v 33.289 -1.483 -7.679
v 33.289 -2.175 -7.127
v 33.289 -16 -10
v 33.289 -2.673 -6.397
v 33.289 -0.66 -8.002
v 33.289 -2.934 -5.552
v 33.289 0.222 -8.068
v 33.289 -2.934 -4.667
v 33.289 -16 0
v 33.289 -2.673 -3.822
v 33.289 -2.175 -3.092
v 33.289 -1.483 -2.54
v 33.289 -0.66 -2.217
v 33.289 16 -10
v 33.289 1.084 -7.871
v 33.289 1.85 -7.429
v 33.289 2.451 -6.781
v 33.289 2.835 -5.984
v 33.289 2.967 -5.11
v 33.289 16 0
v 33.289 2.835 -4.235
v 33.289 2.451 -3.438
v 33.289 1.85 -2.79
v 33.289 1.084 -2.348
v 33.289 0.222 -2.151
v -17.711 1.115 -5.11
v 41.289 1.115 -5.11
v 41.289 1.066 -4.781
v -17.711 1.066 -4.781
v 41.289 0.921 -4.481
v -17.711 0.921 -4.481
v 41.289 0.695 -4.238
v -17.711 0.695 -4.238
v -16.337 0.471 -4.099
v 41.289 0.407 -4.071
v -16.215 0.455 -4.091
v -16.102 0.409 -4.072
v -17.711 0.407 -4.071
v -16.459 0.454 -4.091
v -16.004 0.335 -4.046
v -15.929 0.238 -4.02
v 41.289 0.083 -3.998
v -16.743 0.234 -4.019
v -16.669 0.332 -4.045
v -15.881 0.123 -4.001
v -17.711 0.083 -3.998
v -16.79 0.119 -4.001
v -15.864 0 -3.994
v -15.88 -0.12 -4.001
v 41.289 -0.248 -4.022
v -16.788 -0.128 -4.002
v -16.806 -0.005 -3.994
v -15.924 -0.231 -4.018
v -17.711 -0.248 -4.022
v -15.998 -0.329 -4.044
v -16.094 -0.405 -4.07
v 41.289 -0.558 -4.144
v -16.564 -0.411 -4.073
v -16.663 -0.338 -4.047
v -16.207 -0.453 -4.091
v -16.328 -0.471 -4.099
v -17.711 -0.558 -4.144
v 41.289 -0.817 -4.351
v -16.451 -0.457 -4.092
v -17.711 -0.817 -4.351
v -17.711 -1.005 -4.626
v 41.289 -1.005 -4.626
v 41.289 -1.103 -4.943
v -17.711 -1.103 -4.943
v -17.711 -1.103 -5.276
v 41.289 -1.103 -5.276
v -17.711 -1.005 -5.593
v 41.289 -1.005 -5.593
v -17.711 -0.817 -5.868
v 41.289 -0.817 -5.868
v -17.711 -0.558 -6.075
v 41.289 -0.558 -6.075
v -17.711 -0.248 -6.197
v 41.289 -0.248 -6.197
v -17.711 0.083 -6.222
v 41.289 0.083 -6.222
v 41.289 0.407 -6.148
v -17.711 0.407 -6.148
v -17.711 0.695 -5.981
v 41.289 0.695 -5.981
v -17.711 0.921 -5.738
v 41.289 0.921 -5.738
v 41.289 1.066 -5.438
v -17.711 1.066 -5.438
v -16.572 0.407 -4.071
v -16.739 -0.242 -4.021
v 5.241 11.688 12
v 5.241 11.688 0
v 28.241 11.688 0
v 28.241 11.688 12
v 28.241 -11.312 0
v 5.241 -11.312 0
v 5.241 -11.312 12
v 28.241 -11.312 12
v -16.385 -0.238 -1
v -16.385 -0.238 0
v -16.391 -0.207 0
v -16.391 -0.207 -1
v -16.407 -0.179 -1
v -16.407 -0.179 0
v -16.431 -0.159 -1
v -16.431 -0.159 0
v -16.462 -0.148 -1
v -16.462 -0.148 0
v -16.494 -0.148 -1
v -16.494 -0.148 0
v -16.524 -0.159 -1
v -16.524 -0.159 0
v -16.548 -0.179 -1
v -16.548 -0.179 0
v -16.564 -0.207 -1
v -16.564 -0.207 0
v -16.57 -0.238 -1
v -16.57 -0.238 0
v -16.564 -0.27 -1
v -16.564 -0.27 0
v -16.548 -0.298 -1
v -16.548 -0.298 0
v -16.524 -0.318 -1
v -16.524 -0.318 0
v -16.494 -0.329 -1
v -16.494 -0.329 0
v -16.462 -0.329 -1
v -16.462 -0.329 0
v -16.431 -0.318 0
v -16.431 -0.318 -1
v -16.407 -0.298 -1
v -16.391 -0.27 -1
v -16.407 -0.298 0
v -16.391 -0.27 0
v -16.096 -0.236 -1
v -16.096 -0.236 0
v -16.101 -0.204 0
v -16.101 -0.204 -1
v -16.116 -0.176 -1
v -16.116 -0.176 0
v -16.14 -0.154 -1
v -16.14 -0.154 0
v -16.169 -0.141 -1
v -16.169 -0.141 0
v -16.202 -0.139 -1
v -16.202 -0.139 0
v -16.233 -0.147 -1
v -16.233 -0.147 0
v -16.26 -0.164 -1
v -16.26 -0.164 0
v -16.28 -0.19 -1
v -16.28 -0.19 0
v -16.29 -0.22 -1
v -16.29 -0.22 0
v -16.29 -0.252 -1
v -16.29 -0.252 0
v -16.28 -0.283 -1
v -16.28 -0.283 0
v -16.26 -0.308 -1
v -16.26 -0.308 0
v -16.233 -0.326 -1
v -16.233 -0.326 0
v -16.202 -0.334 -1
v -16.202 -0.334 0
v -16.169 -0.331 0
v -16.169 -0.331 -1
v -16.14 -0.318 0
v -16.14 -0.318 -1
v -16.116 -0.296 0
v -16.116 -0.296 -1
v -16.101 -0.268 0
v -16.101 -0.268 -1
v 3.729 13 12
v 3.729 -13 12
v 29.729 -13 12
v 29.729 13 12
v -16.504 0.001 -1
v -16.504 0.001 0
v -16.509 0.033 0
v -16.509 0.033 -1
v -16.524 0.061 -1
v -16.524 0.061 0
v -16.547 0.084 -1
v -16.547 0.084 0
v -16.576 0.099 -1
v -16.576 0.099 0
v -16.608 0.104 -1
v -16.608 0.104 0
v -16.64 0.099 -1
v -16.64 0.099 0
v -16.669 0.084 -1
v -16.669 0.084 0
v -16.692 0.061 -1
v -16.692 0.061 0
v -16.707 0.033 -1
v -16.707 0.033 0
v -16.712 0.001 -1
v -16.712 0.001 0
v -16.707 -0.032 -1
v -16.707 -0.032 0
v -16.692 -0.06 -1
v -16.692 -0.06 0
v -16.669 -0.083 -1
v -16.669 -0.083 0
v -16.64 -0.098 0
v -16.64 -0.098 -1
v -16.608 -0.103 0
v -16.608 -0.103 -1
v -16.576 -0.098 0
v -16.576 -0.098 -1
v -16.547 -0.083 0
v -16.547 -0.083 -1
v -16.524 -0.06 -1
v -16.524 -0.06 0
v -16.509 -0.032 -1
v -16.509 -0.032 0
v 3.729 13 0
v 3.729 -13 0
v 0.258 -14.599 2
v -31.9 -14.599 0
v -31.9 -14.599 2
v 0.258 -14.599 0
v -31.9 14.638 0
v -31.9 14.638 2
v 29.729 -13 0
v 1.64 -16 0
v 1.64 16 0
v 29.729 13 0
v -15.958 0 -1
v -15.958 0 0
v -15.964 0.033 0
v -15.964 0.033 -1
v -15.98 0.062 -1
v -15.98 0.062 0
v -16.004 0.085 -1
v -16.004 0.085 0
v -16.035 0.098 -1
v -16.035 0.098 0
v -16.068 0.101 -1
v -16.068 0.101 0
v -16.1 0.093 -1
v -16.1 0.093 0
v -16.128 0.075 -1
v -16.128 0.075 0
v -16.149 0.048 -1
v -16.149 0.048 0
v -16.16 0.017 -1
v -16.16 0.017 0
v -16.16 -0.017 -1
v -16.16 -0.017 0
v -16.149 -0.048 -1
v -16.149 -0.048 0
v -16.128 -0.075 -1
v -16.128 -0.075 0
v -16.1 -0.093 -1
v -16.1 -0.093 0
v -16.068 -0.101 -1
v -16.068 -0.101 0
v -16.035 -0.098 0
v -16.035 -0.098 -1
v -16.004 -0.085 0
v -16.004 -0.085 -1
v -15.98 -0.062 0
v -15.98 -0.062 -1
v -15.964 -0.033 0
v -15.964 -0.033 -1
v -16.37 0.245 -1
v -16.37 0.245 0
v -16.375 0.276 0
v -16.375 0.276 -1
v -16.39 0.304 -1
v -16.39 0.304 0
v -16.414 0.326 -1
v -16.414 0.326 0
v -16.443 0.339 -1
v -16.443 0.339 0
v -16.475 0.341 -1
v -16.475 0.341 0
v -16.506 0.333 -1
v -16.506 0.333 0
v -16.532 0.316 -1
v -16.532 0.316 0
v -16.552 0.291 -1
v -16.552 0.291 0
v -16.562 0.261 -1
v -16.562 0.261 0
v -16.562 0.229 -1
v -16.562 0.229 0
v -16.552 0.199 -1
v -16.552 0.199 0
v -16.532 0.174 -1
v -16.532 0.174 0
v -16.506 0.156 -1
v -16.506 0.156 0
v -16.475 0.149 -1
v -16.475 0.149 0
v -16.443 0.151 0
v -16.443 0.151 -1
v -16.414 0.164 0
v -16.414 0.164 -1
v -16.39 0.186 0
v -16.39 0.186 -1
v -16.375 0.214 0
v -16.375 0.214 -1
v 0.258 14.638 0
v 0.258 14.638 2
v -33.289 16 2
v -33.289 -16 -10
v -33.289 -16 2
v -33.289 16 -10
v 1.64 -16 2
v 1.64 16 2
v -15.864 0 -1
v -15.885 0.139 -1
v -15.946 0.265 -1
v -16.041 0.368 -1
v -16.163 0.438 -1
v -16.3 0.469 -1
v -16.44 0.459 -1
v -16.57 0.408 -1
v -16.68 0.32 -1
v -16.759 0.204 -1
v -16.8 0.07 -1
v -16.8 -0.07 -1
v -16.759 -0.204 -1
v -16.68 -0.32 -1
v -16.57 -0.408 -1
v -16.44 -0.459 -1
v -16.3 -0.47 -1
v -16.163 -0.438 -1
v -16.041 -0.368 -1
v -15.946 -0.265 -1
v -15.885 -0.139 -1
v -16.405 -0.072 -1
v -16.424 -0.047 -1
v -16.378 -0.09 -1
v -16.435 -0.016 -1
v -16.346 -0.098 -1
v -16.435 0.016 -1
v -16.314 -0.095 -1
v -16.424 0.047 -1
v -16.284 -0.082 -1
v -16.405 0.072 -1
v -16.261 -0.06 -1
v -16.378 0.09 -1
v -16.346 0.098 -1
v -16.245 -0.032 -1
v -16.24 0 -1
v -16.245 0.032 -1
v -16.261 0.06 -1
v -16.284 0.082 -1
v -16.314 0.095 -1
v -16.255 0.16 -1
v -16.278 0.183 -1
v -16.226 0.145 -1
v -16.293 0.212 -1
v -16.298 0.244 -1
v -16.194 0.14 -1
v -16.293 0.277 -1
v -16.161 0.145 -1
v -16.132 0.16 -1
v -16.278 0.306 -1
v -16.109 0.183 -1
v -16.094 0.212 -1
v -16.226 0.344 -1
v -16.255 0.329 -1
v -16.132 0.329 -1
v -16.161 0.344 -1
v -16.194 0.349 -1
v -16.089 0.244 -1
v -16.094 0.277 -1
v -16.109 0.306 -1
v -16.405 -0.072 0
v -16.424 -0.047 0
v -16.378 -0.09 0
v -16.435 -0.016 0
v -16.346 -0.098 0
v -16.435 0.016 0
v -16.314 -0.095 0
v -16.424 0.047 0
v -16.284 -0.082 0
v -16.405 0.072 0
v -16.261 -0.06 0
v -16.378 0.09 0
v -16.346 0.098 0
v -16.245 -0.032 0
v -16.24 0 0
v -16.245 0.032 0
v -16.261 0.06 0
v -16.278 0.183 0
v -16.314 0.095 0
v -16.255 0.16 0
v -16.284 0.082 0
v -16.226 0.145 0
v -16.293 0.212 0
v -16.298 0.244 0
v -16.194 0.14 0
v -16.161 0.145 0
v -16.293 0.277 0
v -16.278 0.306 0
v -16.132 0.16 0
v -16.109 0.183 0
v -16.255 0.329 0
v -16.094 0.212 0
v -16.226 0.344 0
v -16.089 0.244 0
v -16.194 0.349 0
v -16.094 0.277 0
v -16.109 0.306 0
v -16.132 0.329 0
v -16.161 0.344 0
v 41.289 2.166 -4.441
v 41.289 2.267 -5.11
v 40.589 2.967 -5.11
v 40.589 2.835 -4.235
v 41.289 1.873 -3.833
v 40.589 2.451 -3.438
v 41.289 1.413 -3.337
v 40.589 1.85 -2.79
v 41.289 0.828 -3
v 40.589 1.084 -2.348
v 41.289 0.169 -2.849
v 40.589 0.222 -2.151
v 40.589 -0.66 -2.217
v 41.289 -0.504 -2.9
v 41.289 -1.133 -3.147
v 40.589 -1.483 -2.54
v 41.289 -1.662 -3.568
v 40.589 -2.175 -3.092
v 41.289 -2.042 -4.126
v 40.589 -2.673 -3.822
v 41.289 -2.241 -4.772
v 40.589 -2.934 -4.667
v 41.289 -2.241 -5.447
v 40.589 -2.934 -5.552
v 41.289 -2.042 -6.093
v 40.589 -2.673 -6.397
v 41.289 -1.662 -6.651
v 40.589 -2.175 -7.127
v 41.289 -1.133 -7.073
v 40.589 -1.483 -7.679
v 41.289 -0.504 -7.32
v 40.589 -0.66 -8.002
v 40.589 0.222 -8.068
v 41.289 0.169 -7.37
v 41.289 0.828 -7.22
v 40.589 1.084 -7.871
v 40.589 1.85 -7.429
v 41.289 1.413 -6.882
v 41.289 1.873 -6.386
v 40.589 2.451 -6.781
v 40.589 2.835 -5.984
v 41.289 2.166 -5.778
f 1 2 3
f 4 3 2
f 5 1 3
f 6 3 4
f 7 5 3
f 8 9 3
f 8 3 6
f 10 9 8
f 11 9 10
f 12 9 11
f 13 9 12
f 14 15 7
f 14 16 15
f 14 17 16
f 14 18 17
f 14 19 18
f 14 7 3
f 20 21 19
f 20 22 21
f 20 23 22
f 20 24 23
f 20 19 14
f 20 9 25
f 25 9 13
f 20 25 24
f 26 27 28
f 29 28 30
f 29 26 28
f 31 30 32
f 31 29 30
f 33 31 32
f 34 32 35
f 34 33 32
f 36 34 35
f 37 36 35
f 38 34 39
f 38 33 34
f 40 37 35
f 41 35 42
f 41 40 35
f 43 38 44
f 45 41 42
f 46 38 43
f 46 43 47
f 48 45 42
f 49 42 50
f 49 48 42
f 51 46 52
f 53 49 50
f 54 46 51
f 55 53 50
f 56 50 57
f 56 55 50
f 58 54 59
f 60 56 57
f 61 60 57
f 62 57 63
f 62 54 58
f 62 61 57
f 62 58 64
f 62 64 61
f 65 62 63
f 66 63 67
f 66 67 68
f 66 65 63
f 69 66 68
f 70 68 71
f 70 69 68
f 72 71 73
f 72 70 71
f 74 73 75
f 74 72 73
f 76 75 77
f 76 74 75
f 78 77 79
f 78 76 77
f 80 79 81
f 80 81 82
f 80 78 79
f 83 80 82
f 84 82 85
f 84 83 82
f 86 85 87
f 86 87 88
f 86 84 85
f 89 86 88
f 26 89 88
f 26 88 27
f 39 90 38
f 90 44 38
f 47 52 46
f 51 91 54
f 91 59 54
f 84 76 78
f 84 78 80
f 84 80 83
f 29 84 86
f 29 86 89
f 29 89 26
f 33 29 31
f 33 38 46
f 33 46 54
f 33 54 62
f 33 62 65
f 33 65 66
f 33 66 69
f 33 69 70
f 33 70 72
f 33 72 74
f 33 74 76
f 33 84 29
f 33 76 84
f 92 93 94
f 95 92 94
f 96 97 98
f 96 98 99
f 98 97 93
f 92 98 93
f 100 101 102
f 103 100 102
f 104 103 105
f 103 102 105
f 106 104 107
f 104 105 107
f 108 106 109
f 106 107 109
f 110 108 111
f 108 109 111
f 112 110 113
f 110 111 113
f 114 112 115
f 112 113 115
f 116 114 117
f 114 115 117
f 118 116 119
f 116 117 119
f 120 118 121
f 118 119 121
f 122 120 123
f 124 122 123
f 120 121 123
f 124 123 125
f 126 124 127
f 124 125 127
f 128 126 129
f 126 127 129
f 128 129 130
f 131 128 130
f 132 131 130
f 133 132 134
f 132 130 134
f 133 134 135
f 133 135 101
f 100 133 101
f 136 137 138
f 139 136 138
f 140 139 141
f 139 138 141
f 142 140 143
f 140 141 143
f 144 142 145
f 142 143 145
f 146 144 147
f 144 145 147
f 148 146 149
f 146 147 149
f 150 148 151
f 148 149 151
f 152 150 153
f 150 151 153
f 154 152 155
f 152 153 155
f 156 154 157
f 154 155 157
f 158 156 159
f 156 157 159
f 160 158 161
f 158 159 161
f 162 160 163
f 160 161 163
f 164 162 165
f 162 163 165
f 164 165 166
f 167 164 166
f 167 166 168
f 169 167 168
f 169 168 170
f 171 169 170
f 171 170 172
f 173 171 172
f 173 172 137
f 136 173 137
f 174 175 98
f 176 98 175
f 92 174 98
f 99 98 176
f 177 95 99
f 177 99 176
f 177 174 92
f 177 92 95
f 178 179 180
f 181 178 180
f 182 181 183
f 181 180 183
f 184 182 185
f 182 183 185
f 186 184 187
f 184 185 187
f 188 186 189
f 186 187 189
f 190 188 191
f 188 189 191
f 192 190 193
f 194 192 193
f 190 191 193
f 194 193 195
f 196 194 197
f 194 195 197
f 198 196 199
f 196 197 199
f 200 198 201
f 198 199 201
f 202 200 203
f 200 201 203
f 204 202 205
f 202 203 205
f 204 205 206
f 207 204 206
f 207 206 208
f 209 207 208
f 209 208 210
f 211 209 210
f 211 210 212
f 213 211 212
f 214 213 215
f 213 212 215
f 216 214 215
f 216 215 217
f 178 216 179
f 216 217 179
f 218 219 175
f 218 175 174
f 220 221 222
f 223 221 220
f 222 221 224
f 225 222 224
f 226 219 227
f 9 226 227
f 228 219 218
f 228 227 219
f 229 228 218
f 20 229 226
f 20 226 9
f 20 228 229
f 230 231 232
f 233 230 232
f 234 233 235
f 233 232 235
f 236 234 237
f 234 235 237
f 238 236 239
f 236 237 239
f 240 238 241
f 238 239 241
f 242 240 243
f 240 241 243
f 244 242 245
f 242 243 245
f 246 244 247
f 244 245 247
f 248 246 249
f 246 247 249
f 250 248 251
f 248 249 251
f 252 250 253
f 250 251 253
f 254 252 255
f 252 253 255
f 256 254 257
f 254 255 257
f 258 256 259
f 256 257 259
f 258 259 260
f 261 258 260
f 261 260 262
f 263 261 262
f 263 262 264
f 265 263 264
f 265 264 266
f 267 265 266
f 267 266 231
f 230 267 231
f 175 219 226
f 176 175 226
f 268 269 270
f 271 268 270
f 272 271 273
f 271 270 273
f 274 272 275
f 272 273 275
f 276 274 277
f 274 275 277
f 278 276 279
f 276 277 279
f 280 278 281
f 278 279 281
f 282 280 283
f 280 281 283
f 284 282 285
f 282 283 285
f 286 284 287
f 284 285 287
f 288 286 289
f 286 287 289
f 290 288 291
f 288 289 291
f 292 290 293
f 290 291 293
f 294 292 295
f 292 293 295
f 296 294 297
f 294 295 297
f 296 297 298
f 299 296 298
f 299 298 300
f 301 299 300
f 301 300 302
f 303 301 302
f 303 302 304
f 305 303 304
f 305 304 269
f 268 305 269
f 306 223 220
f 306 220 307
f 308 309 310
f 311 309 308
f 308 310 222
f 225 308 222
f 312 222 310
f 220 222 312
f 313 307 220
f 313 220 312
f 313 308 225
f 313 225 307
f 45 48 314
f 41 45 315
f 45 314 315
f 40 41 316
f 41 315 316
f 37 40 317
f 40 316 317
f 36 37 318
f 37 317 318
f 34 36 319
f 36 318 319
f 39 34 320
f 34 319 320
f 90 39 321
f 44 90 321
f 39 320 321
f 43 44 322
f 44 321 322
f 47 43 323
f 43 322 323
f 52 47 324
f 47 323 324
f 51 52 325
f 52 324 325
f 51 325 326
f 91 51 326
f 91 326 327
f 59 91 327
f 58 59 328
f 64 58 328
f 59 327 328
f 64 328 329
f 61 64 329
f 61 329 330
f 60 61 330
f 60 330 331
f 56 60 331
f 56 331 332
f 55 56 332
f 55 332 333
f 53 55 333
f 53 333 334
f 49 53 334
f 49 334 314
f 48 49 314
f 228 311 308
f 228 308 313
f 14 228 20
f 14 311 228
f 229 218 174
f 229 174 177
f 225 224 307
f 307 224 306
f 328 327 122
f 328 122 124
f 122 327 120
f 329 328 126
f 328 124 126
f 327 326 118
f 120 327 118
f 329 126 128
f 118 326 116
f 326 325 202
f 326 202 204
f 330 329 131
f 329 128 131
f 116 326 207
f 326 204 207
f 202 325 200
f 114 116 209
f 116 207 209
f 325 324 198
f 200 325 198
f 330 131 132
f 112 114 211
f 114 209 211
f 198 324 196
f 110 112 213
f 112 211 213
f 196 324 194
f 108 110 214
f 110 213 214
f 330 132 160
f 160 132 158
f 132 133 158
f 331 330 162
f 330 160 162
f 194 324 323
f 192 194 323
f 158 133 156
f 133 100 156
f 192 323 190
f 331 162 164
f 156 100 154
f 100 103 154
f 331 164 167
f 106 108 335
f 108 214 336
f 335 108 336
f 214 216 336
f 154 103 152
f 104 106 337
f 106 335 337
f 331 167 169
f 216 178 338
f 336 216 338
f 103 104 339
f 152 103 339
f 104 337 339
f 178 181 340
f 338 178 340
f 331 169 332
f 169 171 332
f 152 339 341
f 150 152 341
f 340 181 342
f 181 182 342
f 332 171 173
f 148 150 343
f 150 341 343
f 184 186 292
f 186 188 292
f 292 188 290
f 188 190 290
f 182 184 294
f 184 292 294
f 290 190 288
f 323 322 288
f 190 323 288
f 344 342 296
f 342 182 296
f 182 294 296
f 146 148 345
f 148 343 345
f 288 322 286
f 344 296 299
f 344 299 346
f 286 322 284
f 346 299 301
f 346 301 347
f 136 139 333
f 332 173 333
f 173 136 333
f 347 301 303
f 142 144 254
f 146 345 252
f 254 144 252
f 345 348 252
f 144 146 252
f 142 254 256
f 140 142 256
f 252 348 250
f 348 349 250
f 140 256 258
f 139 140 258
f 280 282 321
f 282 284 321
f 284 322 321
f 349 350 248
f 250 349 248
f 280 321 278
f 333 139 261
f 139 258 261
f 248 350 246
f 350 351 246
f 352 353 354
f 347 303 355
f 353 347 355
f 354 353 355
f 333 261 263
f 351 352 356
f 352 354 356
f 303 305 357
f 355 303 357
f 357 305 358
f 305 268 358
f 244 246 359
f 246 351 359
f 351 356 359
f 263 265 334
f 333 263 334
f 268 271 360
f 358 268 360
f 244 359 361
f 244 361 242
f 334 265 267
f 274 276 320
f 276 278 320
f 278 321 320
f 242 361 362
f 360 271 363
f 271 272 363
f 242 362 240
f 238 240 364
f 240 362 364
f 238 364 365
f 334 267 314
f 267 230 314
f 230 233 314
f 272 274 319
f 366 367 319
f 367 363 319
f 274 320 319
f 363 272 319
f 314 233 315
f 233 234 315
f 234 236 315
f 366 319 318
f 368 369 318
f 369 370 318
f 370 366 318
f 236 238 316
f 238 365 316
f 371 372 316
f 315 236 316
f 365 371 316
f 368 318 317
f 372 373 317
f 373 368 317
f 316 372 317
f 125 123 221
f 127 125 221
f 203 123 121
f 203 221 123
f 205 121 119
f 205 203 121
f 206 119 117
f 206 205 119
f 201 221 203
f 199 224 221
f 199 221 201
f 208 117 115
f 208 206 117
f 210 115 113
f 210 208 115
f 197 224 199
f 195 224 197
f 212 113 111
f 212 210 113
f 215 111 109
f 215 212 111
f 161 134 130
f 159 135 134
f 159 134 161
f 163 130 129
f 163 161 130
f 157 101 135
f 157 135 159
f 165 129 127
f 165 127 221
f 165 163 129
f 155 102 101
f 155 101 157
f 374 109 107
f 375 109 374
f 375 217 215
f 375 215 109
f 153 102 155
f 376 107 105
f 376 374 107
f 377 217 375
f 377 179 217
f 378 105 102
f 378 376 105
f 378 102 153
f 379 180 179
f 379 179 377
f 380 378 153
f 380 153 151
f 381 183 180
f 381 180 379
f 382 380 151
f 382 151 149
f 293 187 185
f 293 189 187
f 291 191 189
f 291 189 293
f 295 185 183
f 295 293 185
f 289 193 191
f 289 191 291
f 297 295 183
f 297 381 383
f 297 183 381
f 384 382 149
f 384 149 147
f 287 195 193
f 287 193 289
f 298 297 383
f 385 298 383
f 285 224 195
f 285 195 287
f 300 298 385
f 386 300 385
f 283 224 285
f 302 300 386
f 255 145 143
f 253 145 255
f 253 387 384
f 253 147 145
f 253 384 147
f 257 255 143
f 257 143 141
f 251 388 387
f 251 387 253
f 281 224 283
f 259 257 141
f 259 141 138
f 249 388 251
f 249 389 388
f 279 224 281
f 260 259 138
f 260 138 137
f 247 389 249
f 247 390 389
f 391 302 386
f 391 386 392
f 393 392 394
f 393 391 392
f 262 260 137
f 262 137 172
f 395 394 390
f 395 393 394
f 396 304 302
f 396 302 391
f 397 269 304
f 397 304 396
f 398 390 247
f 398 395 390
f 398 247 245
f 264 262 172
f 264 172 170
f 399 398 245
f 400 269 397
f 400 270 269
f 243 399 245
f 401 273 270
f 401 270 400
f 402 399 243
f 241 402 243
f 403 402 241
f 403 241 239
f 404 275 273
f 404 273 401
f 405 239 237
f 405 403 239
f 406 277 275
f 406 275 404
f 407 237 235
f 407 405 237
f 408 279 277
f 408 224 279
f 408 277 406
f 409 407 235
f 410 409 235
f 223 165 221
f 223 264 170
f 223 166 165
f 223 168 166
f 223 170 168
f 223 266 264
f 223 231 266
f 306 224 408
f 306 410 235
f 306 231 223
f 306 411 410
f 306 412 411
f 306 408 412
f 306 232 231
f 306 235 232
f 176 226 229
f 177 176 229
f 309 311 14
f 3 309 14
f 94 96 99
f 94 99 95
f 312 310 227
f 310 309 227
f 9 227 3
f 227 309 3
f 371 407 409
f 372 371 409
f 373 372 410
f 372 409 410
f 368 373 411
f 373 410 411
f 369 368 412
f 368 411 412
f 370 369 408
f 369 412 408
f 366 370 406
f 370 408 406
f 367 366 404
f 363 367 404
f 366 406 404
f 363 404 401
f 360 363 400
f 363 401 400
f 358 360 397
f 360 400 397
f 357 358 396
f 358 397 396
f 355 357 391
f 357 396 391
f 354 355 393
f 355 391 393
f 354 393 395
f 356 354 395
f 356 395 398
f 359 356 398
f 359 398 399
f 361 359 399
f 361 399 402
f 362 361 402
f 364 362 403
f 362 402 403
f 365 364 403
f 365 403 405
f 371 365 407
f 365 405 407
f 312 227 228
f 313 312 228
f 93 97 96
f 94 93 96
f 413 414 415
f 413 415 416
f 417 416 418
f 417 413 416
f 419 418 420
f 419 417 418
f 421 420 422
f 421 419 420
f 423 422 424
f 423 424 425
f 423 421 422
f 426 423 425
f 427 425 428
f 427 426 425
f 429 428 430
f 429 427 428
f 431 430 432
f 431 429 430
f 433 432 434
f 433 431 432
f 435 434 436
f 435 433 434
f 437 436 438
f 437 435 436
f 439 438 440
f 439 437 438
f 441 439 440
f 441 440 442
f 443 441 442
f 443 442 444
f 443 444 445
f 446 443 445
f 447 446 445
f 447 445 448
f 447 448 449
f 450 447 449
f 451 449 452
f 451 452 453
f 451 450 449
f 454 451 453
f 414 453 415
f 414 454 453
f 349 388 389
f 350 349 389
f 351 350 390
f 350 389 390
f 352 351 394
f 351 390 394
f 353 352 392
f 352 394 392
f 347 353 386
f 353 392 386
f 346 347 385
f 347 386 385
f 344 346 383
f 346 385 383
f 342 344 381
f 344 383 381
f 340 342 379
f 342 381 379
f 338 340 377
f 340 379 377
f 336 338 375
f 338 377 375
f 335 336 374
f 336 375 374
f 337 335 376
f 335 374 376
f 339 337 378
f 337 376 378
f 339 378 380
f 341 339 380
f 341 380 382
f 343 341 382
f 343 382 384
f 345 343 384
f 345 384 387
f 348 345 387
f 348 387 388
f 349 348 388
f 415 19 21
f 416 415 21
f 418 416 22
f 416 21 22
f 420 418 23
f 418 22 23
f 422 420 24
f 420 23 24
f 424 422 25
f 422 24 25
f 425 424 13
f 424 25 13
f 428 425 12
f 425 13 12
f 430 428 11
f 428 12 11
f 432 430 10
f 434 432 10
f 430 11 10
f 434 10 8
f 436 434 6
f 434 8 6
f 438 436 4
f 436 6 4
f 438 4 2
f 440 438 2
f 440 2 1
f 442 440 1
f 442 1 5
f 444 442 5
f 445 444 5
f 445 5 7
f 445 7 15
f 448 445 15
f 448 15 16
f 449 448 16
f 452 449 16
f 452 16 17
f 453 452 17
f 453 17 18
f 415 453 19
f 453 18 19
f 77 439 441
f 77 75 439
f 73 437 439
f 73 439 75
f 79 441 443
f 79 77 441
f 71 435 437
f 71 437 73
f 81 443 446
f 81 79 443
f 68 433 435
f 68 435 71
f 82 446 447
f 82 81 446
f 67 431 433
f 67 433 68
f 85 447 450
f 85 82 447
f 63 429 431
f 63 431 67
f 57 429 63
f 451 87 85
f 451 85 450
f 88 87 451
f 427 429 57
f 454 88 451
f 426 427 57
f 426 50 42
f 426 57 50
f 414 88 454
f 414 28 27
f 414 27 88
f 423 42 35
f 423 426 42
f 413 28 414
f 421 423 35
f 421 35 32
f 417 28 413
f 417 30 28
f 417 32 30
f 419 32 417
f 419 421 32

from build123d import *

# Parameters (mm, degrees)
F0_W      = 34.9287392313
F0_H      = 32
F0_W_2    = 32.1578574658
F0_H_2    = 29.2369164526
F0_W_3    = 31.648522869
F0_W_4    = 26
F0_H_3    = 26
F0_R      = 0.092316022
F0_R_2    = 0.0979069207
F0_R_3    = 0.103754176
F0_R_4    = 0.0980954436
F0_R_5    = 0.0966883049
F0_R_6    = 0.10446749
F0_R_7    = 0.1013580247
F0_W_5    = 23
F0_H_4    = 23
F1_DEPTH  = 10
F2_DEPTH  = 2
F3_DEPTH  = 12
F4_R      = 1.1151905594
F5_DEPTH  = 51
F4_R_2    = 2.9667518112
F6_DEPTH  = 8
F7_SIZE   = 0.7
F8_DEPTH  = 1
F10_R     = 0.4707857642
F11_DEPTH = 4


with BuildPart() as f1:
    # F0 (on Top) → F1 (new body)
    with BuildSketch(Plane.XY):
        with Locations((-15.8242614345, 0)):
            Rectangle(F0_W, F0_H)
        with Locations((-15.8211605012, 0.0195009634)):
            Rectangle(F0_W_2, F0_H_2, mode=Mode.SUBTRACT)
        with Locations((17.4643696156, 0)):
            Rectangle(F0_W_3, F0_H)
        with Locations((16.7290959507, 0)):
            Rectangle(F0_W_4, F0_H_3, mode=Mode.SUBTRACT)
        with Locations((-15.8211605012, 0.0195009634)):
            Rectangle(F0_W_2, F0_H_2)
        with Locations((-16.4775699377, -0.2384704421)):
            Circle(F0_R, mode=Mode.SUBTRACT)
        with Locations((-16.1935091019, -0.2361788647)):
            Circle(F0_R_2, mode=Mode.SUBTRACT)
        with Locations((-16.6078936309, 0.000503382)):
            Circle(F0_R_3, mode=Mode.SUBTRACT)
        with Locations((-16.3381490856, 0)):
            Circle(F0_R_4, mode=Mode.SUBTRACT)
        with Locations((-16.4667107165, 0.2449084714)):
            Circle(F0_R_5, mode=Mode.SUBTRACT)
        with Locations((-16.1935091019, 0.2444714482)):
            Circle(F0_R_6, mode=Mode.SUBTRACT)
        with Locations((-16.0595625639, 0)):
            Circle(F0_R_7, mode=Mode.SUBTRACT)
        with Locations((16.7290959507, 0)):
            Rectangle(F0_W_4, F0_H_3)
        with Locations((16.7408101037, 0.1883851588)):
            Rectangle(F0_W_5, F0_H_4, mode=Mode.SUBTRACT)
        with Locations((16.7408101037, 0.1883851588)):
            Rectangle(F0_W_5, F0_H_4)
        with Locations((-16.1935091019, 0.2444714482)):
            Circle(F0_R_6)
        with Locations((-16.6078936309, 0.000503382)):
            Circle(F0_R_3)
        with Locations((-16.0595625639, 0)):
            Circle(F0_R_7)
        with Locations((-16.3381490856, 0)):
            Circle(F0_R_4)
        with Locations((-16.1935091019, -0.2361788647)):
            Circle(F0_R_2)
        with Locations((-16.4667107165, 0.2449084714)):
            Circle(F0_R_5)
        with Locations((-16.4775699377, -0.2384704421)):
            Circle(F0_R)
    extrude(amount=-F1_DEPTH)

    # F0 (on Top) → F2 (join)
    with BuildSketch(Plane.XY):
        with Locations((-15.8242614345, 0)):
            Rectangle(F0_W, F0_H)
        with Locations((-15.8211605012, 0.0195009634)):
            Rectangle(F0_W_2, F0_H_2, mode=Mode.SUBTRACT)
    extrude(amount=F2_DEPTH)

    # F0 (on Top) → F3 (join)
    with BuildSketch(Plane.XY):
        with Locations((16.7290959507, 0)):
            Rectangle(F0_W_4, F0_H_3)
        with Locations((16.7408101037, 0.1883851588)):
            Rectangle(F0_W_5, F0_H_4, mode=Mode.SUBTRACT)
    extrude(amount=F3_DEPTH)

    # F4 (on face) → F5 (cut)
    with BuildSketch(Plane.YZ.offset(33.2886310501)):
        with Locations((0, -5.1095909439)):
            Circle(F4_R)
    extrude(amount=-F5_DEPTH, mode=Mode.SUBTRACT)

    # F4 (on face) → F6 (join)
    with BuildSketch(Plane.YZ.offset(33.2886310501)):
        with Locations((0, -5.1095909439)):
            Circle(F4_R_2)
        with Locations((0, -5.1095909439)):
            Circle(F4_R, mode=Mode.SUBTRACT)
    extrude(amount=F6_DEPTH)

    # F7
    f7_edges = [f1.edges().sort_by_distance(p)[0] for p in [
        (41.288631, -2.966752, -5.109591),
    ]]
    chamfer(f7_edges, length=F7_SIZE)

    # F0 (on Top) → F8 (cut)
    with BuildSketch(Plane.XY):
        with Locations((-16.4667107165, 0.2449084714)):
            Circle(F0_R_5)
        with Locations((-16.1935091019, 0.2444714482)):
            Circle(F0_R_6)
        with Locations((-16.0595625639, 0)):
            Circle(F0_R_7)
        with Locations((-16.1935091019, -0.2361788647)):
            Circle(F0_R_2)
        with Locations((-16.4775699377, -0.2384704421)):
            Circle(F0_R)
        with Locations((-16.6078936309, 0.000503382)):
            Circle(F0_R_3)
        with Locations((-16.3381490856, 0)):
            Circle(F0_R_4)
    extrude(amount=-F8_DEPTH, mode=Mode.SUBTRACT)

    # F10 (on offset) → F11 (cut)
    with BuildSketch(Plane.XY.offset(-1)):
        with Locations((-16.3349304348, -0.0002074475)):
            Circle(F10_R)
    extrude(amount=-F11_DEPTH, mode=Mode.SUBTRACT)


solid = f1.part
